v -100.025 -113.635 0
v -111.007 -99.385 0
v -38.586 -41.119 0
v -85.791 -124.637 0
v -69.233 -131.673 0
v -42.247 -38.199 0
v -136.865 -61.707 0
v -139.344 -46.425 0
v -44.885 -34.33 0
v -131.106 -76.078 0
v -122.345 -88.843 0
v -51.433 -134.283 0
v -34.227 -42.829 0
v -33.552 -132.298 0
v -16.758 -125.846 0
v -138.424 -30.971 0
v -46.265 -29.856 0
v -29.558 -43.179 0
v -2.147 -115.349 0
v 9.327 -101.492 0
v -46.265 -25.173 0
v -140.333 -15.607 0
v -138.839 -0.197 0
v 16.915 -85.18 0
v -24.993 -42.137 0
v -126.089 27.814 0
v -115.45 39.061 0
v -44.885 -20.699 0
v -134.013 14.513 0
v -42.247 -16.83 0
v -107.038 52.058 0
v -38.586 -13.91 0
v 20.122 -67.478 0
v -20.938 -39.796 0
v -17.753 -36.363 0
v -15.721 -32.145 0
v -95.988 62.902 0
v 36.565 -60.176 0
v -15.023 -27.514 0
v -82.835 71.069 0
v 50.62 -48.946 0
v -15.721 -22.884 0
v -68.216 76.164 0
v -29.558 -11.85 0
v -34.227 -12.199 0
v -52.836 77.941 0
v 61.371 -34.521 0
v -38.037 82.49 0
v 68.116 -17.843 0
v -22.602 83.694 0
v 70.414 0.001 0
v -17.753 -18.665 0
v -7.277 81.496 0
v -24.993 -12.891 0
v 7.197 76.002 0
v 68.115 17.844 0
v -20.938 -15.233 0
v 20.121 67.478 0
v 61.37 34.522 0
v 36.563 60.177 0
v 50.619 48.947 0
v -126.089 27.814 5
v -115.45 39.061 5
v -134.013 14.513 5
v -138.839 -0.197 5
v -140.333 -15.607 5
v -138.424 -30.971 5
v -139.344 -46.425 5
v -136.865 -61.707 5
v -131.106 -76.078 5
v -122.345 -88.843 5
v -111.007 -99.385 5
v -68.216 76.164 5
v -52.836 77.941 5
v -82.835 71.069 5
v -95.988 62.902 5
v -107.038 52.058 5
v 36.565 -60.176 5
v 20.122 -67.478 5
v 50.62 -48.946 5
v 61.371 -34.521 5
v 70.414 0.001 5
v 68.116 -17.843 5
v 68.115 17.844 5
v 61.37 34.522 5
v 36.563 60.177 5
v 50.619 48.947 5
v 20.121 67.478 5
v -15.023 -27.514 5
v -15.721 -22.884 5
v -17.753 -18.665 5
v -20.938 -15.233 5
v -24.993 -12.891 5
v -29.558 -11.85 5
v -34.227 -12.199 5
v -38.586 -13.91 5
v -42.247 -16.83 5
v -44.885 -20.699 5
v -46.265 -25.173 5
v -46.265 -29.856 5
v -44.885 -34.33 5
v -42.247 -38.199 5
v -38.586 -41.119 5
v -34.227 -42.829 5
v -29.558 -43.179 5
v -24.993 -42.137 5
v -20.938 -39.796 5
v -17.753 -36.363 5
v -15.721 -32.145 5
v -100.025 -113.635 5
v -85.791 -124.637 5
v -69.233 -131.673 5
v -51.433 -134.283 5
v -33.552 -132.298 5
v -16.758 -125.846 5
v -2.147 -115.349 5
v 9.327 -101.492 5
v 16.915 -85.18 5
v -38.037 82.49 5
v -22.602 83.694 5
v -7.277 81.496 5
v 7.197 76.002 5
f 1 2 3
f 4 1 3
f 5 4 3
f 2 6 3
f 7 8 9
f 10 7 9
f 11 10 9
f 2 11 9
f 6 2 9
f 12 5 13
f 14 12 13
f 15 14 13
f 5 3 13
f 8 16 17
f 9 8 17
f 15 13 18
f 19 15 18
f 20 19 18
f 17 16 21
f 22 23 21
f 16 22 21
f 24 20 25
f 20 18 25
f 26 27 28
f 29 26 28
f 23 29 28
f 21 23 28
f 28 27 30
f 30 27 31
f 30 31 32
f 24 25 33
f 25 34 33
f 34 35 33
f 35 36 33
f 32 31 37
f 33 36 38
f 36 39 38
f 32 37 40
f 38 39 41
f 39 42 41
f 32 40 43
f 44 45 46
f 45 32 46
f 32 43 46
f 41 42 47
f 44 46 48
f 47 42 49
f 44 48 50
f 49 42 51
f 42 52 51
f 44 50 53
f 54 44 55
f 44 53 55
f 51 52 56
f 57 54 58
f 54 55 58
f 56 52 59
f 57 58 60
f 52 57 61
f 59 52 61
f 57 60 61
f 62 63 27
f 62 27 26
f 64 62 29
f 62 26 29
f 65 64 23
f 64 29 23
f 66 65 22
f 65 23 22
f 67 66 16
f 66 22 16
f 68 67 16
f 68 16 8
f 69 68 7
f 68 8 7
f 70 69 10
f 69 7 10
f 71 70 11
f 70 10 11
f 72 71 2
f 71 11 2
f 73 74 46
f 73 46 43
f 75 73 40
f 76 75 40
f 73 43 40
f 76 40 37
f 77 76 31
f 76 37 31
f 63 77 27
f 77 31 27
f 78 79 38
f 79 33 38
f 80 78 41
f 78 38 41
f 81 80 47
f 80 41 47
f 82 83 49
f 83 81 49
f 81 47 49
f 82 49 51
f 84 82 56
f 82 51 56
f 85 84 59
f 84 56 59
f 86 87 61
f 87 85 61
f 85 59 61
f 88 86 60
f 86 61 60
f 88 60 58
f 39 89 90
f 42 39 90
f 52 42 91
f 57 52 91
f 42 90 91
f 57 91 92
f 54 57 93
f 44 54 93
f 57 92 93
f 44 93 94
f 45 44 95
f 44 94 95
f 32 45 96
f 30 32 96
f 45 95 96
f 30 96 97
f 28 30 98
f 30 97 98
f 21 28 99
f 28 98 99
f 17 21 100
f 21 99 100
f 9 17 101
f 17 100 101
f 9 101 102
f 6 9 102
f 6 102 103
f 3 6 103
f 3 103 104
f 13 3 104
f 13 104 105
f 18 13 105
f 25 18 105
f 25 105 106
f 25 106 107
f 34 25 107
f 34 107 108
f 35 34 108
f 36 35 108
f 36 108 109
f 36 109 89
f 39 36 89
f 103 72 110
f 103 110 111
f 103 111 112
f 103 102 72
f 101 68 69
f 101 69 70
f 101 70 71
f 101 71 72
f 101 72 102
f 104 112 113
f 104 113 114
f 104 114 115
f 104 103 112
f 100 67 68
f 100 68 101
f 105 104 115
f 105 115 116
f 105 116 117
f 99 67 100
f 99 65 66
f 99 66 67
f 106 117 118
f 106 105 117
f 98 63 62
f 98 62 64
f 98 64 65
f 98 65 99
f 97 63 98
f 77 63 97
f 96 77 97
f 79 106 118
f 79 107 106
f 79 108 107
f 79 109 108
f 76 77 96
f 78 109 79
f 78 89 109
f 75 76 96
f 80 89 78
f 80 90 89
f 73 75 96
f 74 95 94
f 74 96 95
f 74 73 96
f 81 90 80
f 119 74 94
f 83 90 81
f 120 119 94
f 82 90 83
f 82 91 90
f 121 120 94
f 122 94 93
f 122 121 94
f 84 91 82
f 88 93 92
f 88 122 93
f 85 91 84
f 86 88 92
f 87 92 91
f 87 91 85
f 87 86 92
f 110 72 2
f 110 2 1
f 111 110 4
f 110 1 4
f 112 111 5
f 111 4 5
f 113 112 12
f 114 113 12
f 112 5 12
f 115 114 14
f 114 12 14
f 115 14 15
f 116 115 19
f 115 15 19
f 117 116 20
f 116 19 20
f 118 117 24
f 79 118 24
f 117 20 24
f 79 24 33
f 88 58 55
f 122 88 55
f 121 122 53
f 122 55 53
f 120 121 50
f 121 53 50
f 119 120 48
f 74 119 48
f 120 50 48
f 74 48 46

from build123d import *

# Parameters (mm, degrees)
F0_R     = 70.413899
F1_DEPTH = 5
F2_R     = 15.708766
F3_DEPTH = 5.001
F4_COUNT = 6
F4_ANGLE = 200


with BuildPart() as f1:
    # F0 (on Top) → F1 (new body)
    with BuildSketch(Plane.XY):
        Circle(F0_R)
    extrude(amount=F1_DEPTH)

    # F2 (on face) → F3 (cut, through all)
    with BuildSketch(Plane.XY.offset(5)):
        with Locations((-30.731812, -27.514353)):
            Circle(F2_R)
    extrude(amount=-F3_DEPTH, mode=Mode.SUBTRACT)

    # F4: F1 ×6 about axis
    f4_axis = Axis((-30.731812, -27.514353, 0), (0, 0, 1))


with BuildPart() as f1_1:
    add(f1.part)
    for i in range(1, F4_COUNT):
        add(f1.part.rotate(f4_axis, i * F4_ANGLE / (F4_COUNT - 1)))


solid = f1_1.part
